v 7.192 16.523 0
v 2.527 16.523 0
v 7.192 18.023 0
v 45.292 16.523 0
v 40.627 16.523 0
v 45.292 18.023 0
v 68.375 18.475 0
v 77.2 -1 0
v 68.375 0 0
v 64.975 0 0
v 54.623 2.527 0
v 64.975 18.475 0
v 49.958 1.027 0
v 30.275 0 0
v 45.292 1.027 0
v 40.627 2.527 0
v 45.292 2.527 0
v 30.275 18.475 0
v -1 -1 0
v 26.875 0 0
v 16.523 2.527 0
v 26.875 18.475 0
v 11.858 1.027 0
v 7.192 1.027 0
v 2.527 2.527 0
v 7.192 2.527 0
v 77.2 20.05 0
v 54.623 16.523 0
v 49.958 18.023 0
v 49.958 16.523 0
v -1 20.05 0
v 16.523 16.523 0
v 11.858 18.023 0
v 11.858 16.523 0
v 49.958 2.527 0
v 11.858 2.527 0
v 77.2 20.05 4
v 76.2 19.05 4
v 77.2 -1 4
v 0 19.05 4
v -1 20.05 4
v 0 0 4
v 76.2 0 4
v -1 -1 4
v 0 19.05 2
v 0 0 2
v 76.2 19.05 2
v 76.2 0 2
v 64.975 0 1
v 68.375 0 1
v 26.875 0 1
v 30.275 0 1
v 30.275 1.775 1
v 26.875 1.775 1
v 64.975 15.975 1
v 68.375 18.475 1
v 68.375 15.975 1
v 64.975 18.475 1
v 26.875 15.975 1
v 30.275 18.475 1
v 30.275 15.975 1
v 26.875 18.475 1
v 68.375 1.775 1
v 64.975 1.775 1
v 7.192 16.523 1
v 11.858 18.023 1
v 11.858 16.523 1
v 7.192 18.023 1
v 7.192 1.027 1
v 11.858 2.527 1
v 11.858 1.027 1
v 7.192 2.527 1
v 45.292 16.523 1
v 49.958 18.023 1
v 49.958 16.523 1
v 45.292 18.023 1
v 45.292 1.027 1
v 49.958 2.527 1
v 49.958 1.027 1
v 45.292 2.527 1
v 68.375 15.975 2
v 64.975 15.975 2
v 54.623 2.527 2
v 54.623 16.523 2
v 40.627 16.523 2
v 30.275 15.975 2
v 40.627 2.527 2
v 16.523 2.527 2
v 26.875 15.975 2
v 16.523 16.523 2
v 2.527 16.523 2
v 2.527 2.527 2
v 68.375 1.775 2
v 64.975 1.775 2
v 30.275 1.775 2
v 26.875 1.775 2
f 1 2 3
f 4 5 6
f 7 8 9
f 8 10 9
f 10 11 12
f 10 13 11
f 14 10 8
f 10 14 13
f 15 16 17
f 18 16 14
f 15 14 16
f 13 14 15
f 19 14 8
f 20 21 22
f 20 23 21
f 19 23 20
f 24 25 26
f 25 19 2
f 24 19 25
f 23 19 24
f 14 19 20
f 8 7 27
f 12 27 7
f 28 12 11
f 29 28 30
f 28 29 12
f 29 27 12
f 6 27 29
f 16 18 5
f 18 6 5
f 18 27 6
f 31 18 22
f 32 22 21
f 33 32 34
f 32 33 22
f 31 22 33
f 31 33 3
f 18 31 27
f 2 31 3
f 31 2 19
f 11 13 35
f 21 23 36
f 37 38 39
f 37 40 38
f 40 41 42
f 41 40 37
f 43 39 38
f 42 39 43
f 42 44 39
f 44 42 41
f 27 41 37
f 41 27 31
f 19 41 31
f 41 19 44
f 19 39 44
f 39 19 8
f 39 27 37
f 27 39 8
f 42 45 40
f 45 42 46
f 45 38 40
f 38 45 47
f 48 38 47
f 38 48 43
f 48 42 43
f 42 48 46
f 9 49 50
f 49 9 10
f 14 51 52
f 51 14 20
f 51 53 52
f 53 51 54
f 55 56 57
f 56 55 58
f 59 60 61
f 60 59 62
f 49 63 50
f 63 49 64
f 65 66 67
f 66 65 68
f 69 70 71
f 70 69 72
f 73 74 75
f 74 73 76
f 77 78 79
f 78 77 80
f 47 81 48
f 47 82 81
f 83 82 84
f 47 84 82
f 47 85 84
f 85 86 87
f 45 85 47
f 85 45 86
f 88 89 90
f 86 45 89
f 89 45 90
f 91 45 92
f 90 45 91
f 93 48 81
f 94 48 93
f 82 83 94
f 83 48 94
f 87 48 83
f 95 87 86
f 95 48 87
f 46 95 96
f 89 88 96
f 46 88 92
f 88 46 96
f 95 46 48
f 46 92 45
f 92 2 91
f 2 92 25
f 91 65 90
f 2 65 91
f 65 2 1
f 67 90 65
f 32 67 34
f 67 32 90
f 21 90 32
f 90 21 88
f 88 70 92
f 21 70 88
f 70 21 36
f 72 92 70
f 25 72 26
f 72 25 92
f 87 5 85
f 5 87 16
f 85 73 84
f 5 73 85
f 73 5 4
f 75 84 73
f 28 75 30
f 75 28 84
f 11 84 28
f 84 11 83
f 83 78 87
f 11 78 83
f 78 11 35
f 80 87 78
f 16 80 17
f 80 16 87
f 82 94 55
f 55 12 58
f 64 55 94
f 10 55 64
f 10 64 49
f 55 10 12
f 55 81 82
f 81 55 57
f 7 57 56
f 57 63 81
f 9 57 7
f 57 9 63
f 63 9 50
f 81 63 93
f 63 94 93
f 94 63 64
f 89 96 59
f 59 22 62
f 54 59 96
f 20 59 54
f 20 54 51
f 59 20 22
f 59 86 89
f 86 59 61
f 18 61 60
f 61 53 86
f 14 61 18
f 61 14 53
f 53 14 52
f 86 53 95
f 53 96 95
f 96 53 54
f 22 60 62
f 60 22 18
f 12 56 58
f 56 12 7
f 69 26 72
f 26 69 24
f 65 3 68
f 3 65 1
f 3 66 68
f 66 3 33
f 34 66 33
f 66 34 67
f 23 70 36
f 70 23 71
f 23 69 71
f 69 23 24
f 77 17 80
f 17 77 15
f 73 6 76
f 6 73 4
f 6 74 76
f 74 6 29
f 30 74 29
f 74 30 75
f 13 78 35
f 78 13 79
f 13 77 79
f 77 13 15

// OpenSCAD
// https://media.digikey.com/pdf/Data%20Sheets/Cherry%20PDFs/MX%20Series.pdf

////////////////////////////////////////////////////////////////////////
// micro b panel connector
// Overall width: 25mm
// Max height: 10mm (measured)
// Hole spacing: 18mm (per datasheet adafru.it/3258)
// Mounting screws: #4-40

// Create a void for the panel mount micro USB connector,
// connector pointing towards +Z, mounting holes aligned along X
module panelmicrob_void(d_front, d_back, h_spc = 18, maxh = 12, ovw = 26, h_dia =4.5 ) {
    d_ovl = d_back + d_front;
    // 1. Clearance holes for #4-40 screws, length d_front
    translate([-h_spc/2, 0, -.01])
    cylinder(d=h_dia, h=d_front+.01);
    translate([ h_spc/2, 0, -.01])
    cylinder(d=h_dia, h=d_front+.01);
    // 2. hole for the connector itself est 10x5mm
    translate([ 0, 0, -.01])
    linear_extrude(height=h_dia)
    square([11, 6],center=true);
    
    // 3. Cutout for the thing itself, length d_bac
    translate([0, 0, -d_back])
    linear_extrude(height=d_back)
    hull() {
        translate([-h_spc/2, 0, 0])
        circle(d=maxh);
        translate([ h_spc/2, 0, 0])
        circle(d=maxh);
    }
}
////////////////////////////////////////////////////////////////////////

$fn = 72;

function IN(x) = x * 25.4;

function rest(seq) = [for(i=[1:1:len(seq)-1]) seq[i]];
function reverse(seq) = seq ? concat(reverse(rest(seq)), [seq[0]]) : [];
function isnumber(x) = abs(x) + 1 >= 0;

$layer = 0;

module void_keyswitch() {
    square(IN(.551), center=true);
    if($layer == 1)
    square([IN(.551)/3, IN(.551)+3], center=true);
}

// 1x2, .. 1x2.75: A = .94
// 1x3: A = 1.5
// 1x7: A = 4.5
// 1x8, ..., 10: A = 5.25

$costar_stabilizer_offset_y = -0.65;
$costar_stabilizer_width = 3.3 + .1;
$costar_stabilizer_height = 14.2;
$costar_offset_layer = 5;
// kad uses +-1.65 in X and -6.45+7.75 for costar stabilizers
module void_keyswitch_stabilizer(A, B=0) {
    void_keyswitch();

    for(dx = [-A, A]) {
        translate([-dx, $costar_stabilizer_offset_y]) {
            square([$costar_stabilizer_width, $costar_stabilizer_height+$costar_offset_layer*$layer], center=true);
        }
    }
}

module void_keyswitch_as(N) {
    if(N <= 1.75) void_keyswitch();
    else if(N <= 2.75) void_keyswitch_stabilizer(11.9);
    else if(N <= 3) void_keyswitch_stabilizer(19.05);
    else if(N <= 4) void_keyswitch_stabilizer(28.575);
    else if(N <= 4.5) void_keyswitch_stabilizer(34.671);
    else if(N <= 5.5) void_keyswitch_stabilizer(42.8625);
    else if(N <= 6) void_keyswitch_stabilizer(47.5);
    else if(N <= 6.25) void_keyswitch_stabilizer(50);
    else if(N <= 7) void_keyswitch_stabilizer(50);
    else void_keyswitch_stabilizer(66.75);
}

module keyrow(widths) {
    if(widths) {
        width = widths[0];
        if(width > 0) {
            translate([IN(.375) * width, 0])
            void_keyswitch_as(width);
        }
        translate([IN(.75) * abs(width), 0])
            keyrow(rest(widths));
    }
}

module keyrowsr(rows) {
    if(rows) {
        row = rows[0];
        if(isnumber(row)) {
            translate([0, IN(.75) * row])
            keyrowsr(rest(rows));
        } else {
            translate([0, IN(.375)])
            keyrow(row);
            translate([0, IN(.75)])
            keyrowsr(rest(rows));
        }
    }
}

module keyrows(rows) { keyrowsr(reverse(rows)); }

module cutrows_r(rows, left, ovl) {
    if(rows) {
        row = rows[0];
        height = row[0];
        width = row[1];
        if(left) {
            translate([-IN(.375), -IN(.75)])
            offset(.125) square([width * IN(.75), height * IN(.75)]);
        } else {
            translate([-IN(.375) + width * IN(.75), -IN(.75)])
            offset(.125) square([ovl * IN(.75), height * IN(.75)]);
        }
        translate([0, height*IN(.75)])
        cutrows_r(rest(rows), left, ovl);
    }
}

module cutrows(rows, left=true, ovl=99) { cutrows_r(reverse(rows), left=left, ovl=ovl); }



module layer() {
    difference() {
        square([IN(.75 * $cells_x), IN(.75*$cells_y)]);
        keyrows($layout);
    }
}

$plate_th1 = 1.0;
$plate_th2 = 2.0;
$wall_th = 8;
$num_holes = 6;
$wall = 8;
m3_clearance = 3.6;
m3_counterbore_dia = 5.7;
m3_counterbore_h = 2.5;
m3_threaded_insert = 3.9;
m2_threaded_insert = 3.2;
$angle = 3.5;
$min_h = 13;
function max_h() = $min_h + sin($angle) * (IN(.85*$cells_y) + 2*$wall);
$floor = 2;

module m3_screw_counterbore(len, counterbore_depth=m3_counterbore_h) {
    cylinder(d=m3_clearance, h=len);
    translate([0,0,len-.01])
    cylinder(d=m3_counterbore_dia, h=counterbore_depth);
}

module m3_threaded_insert(len) {
    translate([0,0,-len+.01])
    cylinder(d=m3_threaded_insert, h=len);
}

module distribute(n, t) {
    echo("distribute", n, t);
    for(i=[0:1:n-1]) {
        translate(t * (i / (n-1))) children();
    }
}

module keeb() {

    translate([0,0,$plate_th2])
    linear_extrude($plate_th1, convexity=36) layer($layer=0);

    linear_extrude($plate_th2, convexity=36) layer($layer=1);

    difference() {
        linear_extrude($wall_th, convexity=2)
        difference() {
        translate([-$wall,-$wall,0])
        square([IN(.75 * $cells_x)+2*$wall, IN(.75*$cells_y)+2*$wall]);
        square([IN(.75 * $cells_x), IN(.75*$cells_y)]);
        }

        translate([-$wall/2, -$wall/2])
        distribute($num_holes, [IN(.75 * $cells_x) + $wall,0,0]) {
            m3_screw_counterbore(4, 8);

            translate([0, IN(.75*$cells_y)+$wall/2])
            translate([0, $wall/2])
            m3_screw_counterbore(4, 8);
        }

        let($stage = 1) children();
    }
}

module slice(left, delta, height=32, center=true) {
    linear_extrude(height, center=center, convexity=12)
    offset(delta=delta)
    cutrows($cut, left=left);
}
// %slice(false, delta=.2);

module divided_keyboard(left=1, right=1) {
    if(left)
    color("#ee7777") intersection() { keeb() children(); slice(true, delta=-.2); }
    if(right)
    color("#7777ee") render() intersection() { keeb() children(); slice(false, delta=-.2); }
}

module base_outline() {
    scale([1, 1/cos($angle), 1])
    difference() {
        translate([-$wall,-$wall,0])
        square([IN(.75 * $cells_x)+2*$wall, IN(.75*$cells_y)+2*$wall]);
        square([IN(.75 * $cells_x), IN(.75*$cells_y)]);
    }
}

module shear_yz(v) {
    multmatrix([ [1, 0, 0, 0],
                 [0, 1, v, 0],
                 [0, 0, 1, 0],
                 [0, 0, 0, 1]])
        children();
}

// construct the base with its bottom flat at Z=0
module base0() {
    render() {
        intersection() {
            rotate([$angle, 0, 0]) {
                translate([0,0,-500])
                cube(1000, center=true);
            }
            shear_yz(-tan($angle))
            translate([0, 0, -$min_h]) {
                linear_extrude(height=max_h(), convexity=6) base_outline();

                translate([0,0,-$floor])
                scale([1, 1/cos($angle), 1])
                linear_extrude(height=$floor, convexity=6)
                translate([-$wall,-$wall,0])
                square([IN(.75 * $cells_x)+2*$wall, IN(.75*$cells_y)+2*$wall]);
            }
        }
    }
}

module m2_insert_riser(h, do_void) {
    if(do_void) {
        translate([0,0,-.5])
        cylinder(d=m2_threaded_insert, h=h+2);
    } else {
        cylinder(d=m2_threaded_insert + 3, h=h);
    }
}

module m3_insert_riser(h, do_void) {
    if(do_void) {
        translate([0,0,-.5])
        cylinder(d=m2_threaded_insert, h=h+2);
    } else {
        cylinder(d=m2_threaded_insert + 3, h=h);
    }
}

// put the base with the INTENDED TOP at z=0, slice off the unneeded part,
// add mounting holes for threaded insertts
module base_inplace() {
    difference() {

        intersection()  {
            union() {
                rotate([-$angle, 0, 0]) {
                    difference() {
                        union() {
                            render(convexity=4) base0();
                            let($stage=0) children();
                        }
                        let($stage=1) children();
                    }
                }
                let($stage=2) children();
            }
        }


        let($stage=3) children();

        translate([-$wall/2, -$wall/2])
        distribute($num_holes, [IN(.75 * $cells_x) + $wall,0,0]) {
            color("#ff0000")
            m3_threaded_insert(4);

            translate([0, IN(.75*$cells_y)+$wall/2])
            translate([0, $wall/2])
            color("#ff0000")
            m3_threaded_insert(4);
        }
    }
}

module base() {
    translate([0,0,$min_h])
    rotate([$angle, 0, 0])
    base_inplace() children();
}

module split_base(left, right, frac=.5, inplace=false, delta=.2) {
    ovl_x = IN(.75 * $cells_x) + 2*$wall;
    if(left) {
        intersection() {
            translate([ovl_x*.25-delta-$wall,0,0])
            cube([ovl_x * frac, 1000, 1000], center=true);
            if(inplace) base_inplace() children(); else base() children();
        }
    }
    if(right) {
        intersection() {
            if(inplace) base_inplace() children(); else base() children();
            translate([ovl_x*.75+delta-$wall,0,0])
            cube([ovl_x * frac, 1000, 1000], center=true);
        }
    }
}

module sixteen() {
    $cells_x = 4;
    $cells_y = 4;
    $layout = [ [1, 1, 1, 1], [1, 1, 1, 1], [1, 1, 1, 1], [1, 1, 1, 1] ];

    children();
}

module minimal() {
    $wall_th = 4;
    $plate_th2 = 1.0;
    $cells_x = 4;
    $cells_y = 1;
    $layout = [ [1, 3 ] ];
    children();
}

module clip_post(zz=2, hh=2) {
    rotate([90,0,0])
    linear_extrude(height=3, center=true, convexity=3)
    polygon([
        [1, 0], 
        [1, hh],
        [0, hh],
        [0, hh+zz],
        [1, hh+1+zz],
        [-1, hh+2+zz],
        [-2, 0]
    ]);
}

module clip_board(xx, yy, zz=2, hh=2) {
    translate([-xx/2, -yy/2]) rotate(45) clip_post(zz, hh);
    translate([ xx/2, -yy/2]) rotate(135) clip_post(zz, hh);
    translate([ xx/2,  yy/2]) rotate(-135) clip_post(zz, hh);
    translate([-xx/2,  yy/2]) rotate(-45) clip_post(zz, hh);
}

module post_board(x, y, h, do_void) {
    translate([-x/2, -y/2]) m2_insert_riser(h, do_void);
    translate([ x/2, -y/2]) m2_insert_riser(h, do_void);
    translate([ x/2,  y/2]) m2_insert_riser(h, do_void);
    translate([-x/2,  y/2]) m2_insert_riser(h, do_void);
}

module clip_seesaw() { clip_board(IN(1.3), IN(0.5)); }
module clip_itsybitsy(hh) { clip_board(IN(1.4), IN(0.7), hh=hh); }
module post_neopixel(h, do_void) {
    translate([IN(-.5), IN(.06)])
    m2_insert_riser(h, do_void);
    translate([IN(.5), IN(.06)])
    m2_insert_riser(h, do_void);
}

minimal() { 
    $wall = 1;
    $num_holes = 0;
    keeb();
    // base_inplace() { }
}
// split_base(true, true, inplace=true);

if(1) {
    translate([-$wall-4, -$wall-4,-32]) {
        %cube([200, 150, .1]);
        translate([201,0,0])
        %cube([199, 150, .1]);
    }
}
